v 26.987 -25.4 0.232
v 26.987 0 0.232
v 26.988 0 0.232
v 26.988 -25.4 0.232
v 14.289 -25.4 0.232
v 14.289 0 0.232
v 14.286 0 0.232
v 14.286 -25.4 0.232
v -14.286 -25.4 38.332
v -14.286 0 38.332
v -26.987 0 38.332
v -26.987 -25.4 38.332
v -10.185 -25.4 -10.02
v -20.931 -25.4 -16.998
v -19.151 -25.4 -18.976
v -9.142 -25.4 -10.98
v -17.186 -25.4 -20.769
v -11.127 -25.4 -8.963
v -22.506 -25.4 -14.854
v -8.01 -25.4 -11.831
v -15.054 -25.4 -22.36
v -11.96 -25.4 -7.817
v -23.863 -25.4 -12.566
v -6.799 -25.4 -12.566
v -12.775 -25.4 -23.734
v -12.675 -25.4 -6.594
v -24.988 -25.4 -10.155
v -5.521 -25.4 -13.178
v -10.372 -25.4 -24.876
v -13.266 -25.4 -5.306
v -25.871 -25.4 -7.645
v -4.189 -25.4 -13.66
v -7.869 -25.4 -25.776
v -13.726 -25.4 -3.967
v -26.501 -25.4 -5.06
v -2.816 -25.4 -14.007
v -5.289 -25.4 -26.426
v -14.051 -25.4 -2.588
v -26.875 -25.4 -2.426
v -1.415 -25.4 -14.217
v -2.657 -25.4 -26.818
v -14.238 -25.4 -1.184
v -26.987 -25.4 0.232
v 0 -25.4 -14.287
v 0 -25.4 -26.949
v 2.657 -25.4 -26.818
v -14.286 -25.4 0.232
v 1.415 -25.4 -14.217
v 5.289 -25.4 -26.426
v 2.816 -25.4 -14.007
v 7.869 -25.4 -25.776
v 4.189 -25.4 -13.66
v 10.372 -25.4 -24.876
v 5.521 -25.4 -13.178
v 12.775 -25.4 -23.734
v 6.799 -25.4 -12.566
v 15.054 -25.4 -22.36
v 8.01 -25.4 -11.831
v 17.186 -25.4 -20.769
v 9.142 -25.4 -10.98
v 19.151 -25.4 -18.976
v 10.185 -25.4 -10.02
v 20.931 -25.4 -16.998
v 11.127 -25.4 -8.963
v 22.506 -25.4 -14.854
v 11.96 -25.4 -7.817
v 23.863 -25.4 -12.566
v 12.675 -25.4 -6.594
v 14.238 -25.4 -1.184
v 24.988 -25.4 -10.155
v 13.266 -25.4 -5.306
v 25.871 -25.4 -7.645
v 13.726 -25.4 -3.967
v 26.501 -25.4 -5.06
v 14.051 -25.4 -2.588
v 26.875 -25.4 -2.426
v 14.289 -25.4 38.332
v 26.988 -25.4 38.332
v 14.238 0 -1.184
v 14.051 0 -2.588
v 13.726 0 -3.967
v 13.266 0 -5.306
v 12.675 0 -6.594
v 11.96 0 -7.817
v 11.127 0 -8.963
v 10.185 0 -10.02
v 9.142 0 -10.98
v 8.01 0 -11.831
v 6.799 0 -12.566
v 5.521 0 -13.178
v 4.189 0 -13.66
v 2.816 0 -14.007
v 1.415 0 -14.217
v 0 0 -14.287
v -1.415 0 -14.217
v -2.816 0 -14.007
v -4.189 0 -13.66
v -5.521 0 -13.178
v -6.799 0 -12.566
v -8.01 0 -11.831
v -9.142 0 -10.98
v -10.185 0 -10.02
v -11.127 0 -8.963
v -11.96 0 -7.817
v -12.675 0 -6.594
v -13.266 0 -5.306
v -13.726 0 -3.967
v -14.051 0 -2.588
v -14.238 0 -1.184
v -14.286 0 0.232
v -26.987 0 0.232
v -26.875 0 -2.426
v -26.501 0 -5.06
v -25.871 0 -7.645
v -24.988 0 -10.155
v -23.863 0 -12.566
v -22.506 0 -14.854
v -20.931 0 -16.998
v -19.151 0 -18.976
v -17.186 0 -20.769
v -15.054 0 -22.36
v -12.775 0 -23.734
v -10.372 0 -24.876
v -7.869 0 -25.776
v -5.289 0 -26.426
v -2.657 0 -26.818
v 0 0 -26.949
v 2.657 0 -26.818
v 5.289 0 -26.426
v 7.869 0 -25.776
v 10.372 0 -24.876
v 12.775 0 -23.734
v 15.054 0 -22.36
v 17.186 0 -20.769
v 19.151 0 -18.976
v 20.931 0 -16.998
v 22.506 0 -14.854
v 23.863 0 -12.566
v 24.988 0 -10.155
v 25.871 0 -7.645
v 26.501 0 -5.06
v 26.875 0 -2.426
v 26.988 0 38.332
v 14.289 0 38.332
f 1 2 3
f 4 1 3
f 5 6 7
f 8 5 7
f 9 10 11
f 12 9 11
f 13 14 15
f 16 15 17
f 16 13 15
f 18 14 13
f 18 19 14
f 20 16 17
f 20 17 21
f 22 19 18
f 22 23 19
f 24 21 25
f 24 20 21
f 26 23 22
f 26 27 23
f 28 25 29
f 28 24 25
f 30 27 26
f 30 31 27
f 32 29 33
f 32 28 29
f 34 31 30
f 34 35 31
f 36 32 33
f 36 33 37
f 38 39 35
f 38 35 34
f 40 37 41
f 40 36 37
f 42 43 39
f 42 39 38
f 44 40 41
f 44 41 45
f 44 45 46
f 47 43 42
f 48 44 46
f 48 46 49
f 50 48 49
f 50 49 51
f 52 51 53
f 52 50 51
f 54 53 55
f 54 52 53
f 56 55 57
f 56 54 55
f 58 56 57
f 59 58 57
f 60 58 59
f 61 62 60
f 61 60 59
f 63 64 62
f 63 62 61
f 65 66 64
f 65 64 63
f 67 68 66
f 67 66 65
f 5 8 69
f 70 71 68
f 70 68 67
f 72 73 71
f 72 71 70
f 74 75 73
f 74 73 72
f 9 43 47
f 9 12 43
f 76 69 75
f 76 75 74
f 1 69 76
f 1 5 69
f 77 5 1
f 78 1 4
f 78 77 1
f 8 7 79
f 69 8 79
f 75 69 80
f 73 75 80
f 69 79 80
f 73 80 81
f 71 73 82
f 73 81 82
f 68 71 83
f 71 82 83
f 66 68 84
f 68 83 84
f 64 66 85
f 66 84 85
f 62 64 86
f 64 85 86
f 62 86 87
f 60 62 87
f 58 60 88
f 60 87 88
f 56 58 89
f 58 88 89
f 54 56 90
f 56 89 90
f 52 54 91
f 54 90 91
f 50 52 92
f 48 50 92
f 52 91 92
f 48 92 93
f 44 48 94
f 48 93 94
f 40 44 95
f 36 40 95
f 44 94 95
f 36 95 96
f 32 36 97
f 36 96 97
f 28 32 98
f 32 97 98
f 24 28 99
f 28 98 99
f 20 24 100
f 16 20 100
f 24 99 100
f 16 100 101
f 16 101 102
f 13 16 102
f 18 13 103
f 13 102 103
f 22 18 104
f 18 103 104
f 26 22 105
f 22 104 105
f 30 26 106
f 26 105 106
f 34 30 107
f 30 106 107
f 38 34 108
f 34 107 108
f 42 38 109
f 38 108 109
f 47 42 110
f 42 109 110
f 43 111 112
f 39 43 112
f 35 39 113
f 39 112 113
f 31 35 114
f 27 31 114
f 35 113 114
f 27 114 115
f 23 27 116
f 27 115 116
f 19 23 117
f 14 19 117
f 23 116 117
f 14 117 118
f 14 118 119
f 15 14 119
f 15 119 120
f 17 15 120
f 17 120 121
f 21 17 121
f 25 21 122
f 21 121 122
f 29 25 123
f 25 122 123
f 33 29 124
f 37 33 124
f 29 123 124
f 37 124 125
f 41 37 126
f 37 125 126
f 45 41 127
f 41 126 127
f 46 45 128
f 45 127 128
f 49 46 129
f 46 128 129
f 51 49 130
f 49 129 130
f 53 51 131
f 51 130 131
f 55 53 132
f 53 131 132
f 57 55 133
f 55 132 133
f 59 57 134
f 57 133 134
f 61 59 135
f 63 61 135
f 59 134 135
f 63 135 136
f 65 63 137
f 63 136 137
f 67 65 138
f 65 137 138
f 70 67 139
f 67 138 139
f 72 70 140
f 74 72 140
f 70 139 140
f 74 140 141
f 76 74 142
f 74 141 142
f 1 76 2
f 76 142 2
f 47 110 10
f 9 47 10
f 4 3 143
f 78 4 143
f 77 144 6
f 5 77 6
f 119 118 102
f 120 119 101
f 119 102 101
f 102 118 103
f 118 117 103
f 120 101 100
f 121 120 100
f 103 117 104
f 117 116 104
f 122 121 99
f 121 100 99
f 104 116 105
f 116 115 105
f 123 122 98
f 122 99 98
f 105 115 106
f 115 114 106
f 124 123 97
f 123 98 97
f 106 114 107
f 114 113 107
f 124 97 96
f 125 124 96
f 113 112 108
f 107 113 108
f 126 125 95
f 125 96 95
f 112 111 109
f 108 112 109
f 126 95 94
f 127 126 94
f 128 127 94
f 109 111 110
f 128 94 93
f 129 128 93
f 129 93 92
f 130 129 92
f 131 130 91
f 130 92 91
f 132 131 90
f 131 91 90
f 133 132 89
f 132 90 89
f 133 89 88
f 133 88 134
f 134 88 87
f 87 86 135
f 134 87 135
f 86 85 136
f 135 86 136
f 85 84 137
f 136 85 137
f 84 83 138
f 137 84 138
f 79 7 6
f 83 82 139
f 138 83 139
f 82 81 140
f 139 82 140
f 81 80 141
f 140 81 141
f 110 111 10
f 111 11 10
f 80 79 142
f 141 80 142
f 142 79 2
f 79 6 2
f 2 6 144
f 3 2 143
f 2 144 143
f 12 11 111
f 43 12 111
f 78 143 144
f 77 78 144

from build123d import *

# Parameters (mm, degrees)
F1_DEPTH = 25.4


with BuildPart() as f1:
    # F0 (on Front) → F1 (new body)
    with BuildSketch(Plane.XZ):
        with BuildLine():
            ThreePointArc((14.285613, 0.232226), (0, -14.2875), (-14.285613, 0.232226))
            Line((-14.285613, 0.232226), (-14.285613, 38.332226))
            Line((-14.285613, 38.332226), (-26.986805, 38.332226))
            Line((-26.986805, 38.332226), (-26.986805, 0.232226))
            ThreePointArc((-26.986805, 0.232226), (0, -26.94898), (26.986805, 0.232226))
            Line((26.986805, 0.232226), (26.988195, 0.232226))
            Line((26.988195, 0.232226), (26.988195, 38.332226))
            Line((26.988195, 38.332226), (14.289387, 38.332226))
            Line((14.289387, 38.332226), (14.289387, 0.232226))
            Line((14.289387, 0.232226), (14.285613, 0.232226))
        make_face()
    extrude(amount=F1_DEPTH)


solid = f1.part
